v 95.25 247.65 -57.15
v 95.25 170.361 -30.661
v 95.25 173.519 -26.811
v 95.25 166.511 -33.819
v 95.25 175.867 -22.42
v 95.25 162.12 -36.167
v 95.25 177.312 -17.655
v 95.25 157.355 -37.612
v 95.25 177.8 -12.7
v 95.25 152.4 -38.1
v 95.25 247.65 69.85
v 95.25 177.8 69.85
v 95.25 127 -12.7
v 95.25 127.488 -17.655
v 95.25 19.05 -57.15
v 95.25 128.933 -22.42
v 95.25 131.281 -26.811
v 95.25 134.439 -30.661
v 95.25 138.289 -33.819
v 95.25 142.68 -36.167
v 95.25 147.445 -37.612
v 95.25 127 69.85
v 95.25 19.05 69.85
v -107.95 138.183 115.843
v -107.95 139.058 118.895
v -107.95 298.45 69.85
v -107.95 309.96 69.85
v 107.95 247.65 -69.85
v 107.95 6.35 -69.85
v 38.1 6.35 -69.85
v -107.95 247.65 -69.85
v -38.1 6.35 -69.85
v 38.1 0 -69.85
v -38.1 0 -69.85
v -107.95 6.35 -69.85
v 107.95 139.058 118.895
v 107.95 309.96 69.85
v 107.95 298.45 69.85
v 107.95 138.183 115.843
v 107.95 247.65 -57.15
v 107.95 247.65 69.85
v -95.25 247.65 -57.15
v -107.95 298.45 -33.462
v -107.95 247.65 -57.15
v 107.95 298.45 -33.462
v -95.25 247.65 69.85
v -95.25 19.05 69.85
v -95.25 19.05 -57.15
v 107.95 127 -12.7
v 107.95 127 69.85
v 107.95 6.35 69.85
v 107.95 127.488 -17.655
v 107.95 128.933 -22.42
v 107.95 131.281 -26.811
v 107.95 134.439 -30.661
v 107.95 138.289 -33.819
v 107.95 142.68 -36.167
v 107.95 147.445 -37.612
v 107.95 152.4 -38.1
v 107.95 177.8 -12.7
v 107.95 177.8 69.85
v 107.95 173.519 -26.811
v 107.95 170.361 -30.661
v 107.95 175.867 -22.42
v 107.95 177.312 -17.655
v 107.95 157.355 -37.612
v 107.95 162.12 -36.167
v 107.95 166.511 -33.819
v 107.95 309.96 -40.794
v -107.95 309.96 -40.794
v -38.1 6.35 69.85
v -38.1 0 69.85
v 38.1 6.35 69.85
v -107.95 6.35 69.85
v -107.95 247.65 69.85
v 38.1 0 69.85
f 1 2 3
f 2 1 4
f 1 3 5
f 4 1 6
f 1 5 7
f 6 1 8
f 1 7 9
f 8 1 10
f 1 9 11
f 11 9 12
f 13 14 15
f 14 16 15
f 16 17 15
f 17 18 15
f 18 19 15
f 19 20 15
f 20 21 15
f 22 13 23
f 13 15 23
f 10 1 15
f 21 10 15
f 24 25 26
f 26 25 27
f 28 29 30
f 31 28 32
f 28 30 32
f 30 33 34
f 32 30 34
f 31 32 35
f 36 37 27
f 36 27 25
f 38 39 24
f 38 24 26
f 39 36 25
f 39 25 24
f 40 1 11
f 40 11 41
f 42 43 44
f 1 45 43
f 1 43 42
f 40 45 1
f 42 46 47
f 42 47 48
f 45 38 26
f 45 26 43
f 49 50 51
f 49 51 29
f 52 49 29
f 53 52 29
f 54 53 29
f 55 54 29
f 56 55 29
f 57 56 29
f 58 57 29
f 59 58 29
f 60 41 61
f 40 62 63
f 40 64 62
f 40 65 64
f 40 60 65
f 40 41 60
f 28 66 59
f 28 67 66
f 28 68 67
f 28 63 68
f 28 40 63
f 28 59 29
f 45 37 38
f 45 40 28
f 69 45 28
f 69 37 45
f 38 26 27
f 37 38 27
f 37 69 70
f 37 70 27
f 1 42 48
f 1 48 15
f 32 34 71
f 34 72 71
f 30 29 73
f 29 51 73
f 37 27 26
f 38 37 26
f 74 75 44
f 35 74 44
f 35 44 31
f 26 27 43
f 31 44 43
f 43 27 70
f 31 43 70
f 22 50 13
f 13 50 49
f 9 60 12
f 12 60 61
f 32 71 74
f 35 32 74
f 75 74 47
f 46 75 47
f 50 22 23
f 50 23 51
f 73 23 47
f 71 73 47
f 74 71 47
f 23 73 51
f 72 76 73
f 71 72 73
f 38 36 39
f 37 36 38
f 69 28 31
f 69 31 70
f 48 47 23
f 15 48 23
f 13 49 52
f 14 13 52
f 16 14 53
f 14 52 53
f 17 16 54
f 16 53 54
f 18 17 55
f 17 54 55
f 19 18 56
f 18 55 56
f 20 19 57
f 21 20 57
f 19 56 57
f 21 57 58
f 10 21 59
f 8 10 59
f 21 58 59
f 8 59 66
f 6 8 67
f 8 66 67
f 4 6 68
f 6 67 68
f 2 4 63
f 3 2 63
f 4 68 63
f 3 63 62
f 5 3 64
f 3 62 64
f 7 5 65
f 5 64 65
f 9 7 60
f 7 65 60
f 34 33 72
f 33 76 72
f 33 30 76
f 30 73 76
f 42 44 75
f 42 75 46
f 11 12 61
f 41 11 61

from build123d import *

# Parameters (mm, degrees)
BOSS_EXTRUDE1_DEPTH = 69.85
BOSS_EXTRUDE2_DEPTH = 228.6
BOSS_EXTRUDE3_DEPTH = 215.9
BOSS_EXTRUDE4_DEPTH = 215.9
CUT_EXTRUDE1_DEPTH  = 12.7


with BuildPart() as part:
    # Sketch1 → Boss-Extrude1 (new, symmetric)
    with BuildSketch(Plane.XY):
        Polygon((-107.95, 19.05), (107.95, 19.05), (107.95, 6.35), (38.1, 6.35), (38.1, 0), (-38.1, 0), (-38.1, 6.35), (-107.95, 6.35), align=None)
    extrude(amount=BOSS_EXTRUDE1_DEPTH, both=True)

    # Sketch2 → Boss-Extrude2 (add)
    with BuildSketch(Plane(origin=(0, 19.05, 0), x_dir=(1, 0, 0), z_dir=(0, 1, 0))):
        Polygon((107.95, 69.85), (-107.95, 69.85), (-107.95, -69.85), (-95.25, -69.85), (-95.25, 57.15), (95.25, 57.15), (95.25, -69.85), (107.95, -69.85), align=None)
    extrude(amount=BOSS_EXTRUDE2_DEPTH)

    # Sketch3 → Boss-Extrude3 (add, through all)
    with BuildSketch(Plane(origin=(107.95, 0, 0), x_dir=(0, 0, -1), z_dir=(1, 0, 0))):
        Polygon((57.15, 247.65), (69.85, 247.65), (40.794319042, 309.960108895), (-69.85, 309.960108895), (-69.85, 298.45), (33.461570966, 298.45), align=None)
    extrude(amount=-BOSS_EXTRUDE3_DEPTH)

    # Sketch5 → Cut-Extrude1 (cut)
    with BuildSketch(Plane(origin=(107.95, 0, 0), x_dir=(0, 0, -1), z_dir=(1, 0, 0))):
        with BuildLine():
            Line((12.7, 177.8), (-69.85, 177.8))
            Line((-69.85, 177.8), (-69.85, 127))
            Line((-69.85, 127), (12.7, 127))
            ThreePointArc((12.7, 127), (38.1, 152.4), (12.7, 177.8))
        make_face()
    extrude(amount=-CUT_EXTRUDE1_DEPTH, mode=Mode.SUBTRACT)


with BuildPart() as body_2:
    # Sketch4 → Boss-Extrude4 (new body)
    with BuildSketch(Plane(origin=(107.95, 0, 0), x_dir=(0, 0, -1), z_dir=(1, 0, 0))):
        Polygon((-69.85, 298.45), (-69.85, 309.960108895), (-118.895148498, 139.058343519), (-115.843331259, 138.182537296), align=None)
    extrude(amount=-BOSS_EXTRUDE4_DEPTH)


solid = Compound([part.part, body_2.part])
